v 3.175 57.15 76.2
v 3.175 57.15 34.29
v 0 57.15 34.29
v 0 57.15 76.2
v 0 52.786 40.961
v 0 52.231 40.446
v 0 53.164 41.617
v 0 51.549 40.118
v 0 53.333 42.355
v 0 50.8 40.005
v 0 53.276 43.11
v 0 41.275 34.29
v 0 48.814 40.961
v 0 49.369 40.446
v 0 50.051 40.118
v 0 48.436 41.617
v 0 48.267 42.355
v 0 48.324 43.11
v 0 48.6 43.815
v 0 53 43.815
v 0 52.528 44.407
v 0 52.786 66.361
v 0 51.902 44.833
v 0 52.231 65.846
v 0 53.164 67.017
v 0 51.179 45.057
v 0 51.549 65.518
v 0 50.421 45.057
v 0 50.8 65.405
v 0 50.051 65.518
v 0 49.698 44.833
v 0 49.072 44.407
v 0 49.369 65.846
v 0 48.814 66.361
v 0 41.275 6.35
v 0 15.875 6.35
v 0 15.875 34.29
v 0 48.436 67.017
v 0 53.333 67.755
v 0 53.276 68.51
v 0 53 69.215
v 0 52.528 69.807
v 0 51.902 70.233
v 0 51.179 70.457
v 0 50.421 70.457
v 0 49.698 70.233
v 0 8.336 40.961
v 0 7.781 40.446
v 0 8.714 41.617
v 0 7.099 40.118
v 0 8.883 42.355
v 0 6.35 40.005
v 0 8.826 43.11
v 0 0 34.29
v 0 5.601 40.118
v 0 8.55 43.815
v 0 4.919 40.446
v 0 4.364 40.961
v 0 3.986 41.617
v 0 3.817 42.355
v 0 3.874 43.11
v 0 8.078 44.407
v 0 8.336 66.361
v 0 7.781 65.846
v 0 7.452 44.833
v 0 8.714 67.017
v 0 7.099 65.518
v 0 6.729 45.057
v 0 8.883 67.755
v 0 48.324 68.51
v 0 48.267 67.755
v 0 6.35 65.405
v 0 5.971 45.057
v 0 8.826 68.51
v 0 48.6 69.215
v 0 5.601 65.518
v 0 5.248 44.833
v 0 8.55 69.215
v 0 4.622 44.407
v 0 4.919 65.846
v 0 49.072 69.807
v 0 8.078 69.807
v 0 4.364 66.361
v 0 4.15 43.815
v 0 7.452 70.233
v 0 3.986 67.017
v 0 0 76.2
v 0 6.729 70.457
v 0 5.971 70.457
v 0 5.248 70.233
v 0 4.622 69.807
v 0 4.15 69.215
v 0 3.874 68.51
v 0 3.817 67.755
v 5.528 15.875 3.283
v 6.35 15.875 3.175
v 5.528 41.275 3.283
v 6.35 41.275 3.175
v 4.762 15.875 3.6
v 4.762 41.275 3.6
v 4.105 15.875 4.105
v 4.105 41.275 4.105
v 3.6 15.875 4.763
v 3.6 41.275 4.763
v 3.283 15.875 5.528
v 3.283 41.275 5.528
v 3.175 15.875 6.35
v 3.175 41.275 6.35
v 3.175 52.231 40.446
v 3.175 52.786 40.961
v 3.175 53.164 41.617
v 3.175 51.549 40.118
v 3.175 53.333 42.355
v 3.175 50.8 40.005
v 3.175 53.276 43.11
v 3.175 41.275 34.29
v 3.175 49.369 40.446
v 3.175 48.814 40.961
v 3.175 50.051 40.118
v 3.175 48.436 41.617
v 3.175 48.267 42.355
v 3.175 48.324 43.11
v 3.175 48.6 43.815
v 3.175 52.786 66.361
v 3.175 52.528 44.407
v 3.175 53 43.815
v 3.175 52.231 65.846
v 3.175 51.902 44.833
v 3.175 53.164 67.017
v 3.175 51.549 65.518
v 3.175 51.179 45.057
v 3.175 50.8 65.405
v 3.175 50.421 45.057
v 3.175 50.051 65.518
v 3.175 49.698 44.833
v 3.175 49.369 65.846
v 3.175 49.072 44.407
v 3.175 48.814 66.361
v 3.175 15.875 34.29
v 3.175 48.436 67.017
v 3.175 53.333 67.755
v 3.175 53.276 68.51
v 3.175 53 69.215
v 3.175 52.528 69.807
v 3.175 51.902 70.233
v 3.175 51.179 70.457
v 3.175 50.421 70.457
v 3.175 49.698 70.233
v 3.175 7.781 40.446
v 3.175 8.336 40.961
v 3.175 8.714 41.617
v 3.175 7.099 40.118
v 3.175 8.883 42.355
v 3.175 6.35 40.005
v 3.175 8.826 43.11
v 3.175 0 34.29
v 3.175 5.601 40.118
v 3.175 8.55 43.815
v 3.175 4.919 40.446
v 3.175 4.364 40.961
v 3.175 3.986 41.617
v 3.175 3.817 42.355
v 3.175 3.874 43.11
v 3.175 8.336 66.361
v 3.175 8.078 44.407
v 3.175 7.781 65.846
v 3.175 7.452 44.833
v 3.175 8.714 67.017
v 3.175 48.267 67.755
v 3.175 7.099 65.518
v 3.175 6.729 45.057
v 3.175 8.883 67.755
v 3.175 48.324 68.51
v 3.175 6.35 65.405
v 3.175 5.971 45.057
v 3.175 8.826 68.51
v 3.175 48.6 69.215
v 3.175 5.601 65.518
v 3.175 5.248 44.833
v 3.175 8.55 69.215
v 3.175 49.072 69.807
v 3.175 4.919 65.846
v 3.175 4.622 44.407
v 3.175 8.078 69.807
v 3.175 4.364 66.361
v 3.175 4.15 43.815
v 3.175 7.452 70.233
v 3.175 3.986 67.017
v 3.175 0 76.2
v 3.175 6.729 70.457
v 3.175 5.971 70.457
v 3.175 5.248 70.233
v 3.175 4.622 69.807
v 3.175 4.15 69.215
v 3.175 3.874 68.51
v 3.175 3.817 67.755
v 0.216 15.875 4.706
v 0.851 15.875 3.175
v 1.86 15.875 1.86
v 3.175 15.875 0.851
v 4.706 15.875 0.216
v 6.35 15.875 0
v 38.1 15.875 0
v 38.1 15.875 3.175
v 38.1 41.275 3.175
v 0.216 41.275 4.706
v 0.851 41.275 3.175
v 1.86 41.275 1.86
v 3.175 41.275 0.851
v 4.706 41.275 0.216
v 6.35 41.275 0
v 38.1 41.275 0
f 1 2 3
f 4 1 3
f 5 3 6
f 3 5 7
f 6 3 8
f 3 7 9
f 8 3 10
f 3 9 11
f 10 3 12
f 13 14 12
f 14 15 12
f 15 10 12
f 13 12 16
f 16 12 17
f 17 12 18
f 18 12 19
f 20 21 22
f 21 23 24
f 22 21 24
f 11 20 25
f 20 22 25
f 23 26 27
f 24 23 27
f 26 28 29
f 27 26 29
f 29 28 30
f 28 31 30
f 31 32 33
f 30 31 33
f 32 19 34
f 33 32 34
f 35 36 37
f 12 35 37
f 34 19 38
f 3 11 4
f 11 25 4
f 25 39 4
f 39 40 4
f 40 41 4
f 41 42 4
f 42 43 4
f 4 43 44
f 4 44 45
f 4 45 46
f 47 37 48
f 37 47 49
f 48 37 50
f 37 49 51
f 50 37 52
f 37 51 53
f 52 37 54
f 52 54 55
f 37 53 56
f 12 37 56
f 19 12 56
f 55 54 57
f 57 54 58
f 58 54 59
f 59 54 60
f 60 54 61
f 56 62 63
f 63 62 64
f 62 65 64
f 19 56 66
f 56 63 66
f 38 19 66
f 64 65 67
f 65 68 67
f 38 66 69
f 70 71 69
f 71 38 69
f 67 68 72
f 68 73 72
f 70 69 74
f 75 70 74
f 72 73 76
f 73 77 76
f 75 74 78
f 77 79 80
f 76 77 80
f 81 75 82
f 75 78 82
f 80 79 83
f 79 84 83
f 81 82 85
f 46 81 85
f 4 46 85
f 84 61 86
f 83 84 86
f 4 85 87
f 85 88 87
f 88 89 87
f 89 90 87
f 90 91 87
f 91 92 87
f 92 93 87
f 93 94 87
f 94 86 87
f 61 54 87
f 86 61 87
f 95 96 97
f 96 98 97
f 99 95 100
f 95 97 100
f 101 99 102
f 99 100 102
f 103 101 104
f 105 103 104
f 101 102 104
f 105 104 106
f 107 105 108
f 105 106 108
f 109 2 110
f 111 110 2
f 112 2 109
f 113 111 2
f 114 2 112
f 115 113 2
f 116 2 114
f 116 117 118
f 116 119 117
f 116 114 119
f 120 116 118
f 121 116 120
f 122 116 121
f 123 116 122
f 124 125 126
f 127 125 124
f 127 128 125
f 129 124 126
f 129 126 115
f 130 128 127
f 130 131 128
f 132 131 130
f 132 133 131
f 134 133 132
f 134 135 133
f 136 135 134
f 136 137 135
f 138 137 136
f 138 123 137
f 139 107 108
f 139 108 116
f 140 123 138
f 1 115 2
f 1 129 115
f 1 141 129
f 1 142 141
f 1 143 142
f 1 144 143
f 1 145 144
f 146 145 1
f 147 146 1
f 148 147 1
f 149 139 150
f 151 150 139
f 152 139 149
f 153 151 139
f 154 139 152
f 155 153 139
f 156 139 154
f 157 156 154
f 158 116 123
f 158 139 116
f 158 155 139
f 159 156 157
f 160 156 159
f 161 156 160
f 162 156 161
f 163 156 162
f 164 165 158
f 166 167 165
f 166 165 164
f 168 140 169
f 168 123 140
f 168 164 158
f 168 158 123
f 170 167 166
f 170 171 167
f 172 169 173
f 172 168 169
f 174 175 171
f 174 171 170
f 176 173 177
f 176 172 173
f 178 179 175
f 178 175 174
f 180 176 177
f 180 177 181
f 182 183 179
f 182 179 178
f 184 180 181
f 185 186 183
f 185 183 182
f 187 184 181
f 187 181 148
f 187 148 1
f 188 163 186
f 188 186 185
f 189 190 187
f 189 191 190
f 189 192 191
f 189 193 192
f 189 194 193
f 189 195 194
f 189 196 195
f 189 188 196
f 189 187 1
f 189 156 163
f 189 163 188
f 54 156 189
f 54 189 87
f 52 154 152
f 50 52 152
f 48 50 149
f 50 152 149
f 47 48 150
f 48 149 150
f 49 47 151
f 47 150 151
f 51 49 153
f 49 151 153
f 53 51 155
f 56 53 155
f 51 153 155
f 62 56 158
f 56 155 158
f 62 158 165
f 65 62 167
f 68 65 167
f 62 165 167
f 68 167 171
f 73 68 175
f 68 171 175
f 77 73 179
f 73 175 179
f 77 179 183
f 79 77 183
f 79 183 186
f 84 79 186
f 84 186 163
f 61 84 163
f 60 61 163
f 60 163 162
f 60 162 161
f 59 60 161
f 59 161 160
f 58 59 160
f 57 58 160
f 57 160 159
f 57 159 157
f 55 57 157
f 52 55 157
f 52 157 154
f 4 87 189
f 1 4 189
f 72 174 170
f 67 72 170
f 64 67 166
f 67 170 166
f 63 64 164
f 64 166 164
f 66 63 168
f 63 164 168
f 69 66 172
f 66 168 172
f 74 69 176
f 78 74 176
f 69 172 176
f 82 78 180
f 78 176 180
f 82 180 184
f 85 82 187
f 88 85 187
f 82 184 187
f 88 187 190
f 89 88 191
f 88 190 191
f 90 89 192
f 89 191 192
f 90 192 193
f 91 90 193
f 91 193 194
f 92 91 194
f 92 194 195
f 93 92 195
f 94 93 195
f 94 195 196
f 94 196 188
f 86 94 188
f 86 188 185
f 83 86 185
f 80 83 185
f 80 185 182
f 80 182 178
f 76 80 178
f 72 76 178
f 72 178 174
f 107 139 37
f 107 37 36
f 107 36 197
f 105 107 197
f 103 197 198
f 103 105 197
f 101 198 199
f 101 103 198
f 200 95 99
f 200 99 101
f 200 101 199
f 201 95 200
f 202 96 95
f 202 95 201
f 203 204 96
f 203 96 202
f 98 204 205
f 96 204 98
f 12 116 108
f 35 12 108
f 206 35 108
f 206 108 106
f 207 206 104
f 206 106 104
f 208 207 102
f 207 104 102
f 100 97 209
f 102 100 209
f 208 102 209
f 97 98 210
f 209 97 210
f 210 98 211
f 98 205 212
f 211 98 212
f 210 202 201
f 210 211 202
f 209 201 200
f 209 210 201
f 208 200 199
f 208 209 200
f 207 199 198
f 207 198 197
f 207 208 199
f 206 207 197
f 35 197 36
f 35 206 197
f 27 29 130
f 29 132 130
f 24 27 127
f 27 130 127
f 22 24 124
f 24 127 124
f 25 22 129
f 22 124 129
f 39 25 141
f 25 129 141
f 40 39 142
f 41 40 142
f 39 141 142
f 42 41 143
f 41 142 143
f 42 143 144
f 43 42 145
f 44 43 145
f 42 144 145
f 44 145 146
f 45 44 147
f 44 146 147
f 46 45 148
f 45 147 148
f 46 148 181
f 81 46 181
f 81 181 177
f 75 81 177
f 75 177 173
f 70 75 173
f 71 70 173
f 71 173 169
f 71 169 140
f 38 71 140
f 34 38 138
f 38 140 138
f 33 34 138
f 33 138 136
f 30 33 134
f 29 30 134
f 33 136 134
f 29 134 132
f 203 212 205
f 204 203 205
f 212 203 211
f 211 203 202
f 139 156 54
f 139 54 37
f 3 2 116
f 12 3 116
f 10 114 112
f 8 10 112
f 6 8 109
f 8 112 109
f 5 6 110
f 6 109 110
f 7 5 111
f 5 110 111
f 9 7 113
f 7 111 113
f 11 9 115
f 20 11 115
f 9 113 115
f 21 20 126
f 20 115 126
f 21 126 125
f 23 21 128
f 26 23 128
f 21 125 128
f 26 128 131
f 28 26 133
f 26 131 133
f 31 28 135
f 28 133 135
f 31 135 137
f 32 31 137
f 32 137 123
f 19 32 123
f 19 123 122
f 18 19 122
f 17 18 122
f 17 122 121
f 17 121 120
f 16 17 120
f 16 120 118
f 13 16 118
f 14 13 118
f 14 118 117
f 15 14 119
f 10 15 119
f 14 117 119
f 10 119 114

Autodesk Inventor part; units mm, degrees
ref_plane "YZ Plane" through (0, 0, 0) normal (1, 0, 0) x (0, 1, 0)
ref_plane "XZ Plane" through (0, 0, 0) normal (0, 1, 0) x (-1, 0, 0)
ref_plane "XY Plane" through (0, 0, 0) normal (0, 0, 1) x (1, 0, 0)
sketch "Sketch1" plane through (0, 0, 0) normal (0, 1, 0) x (-1, 0, 0)
  line L0 (-38.1, 0) -> (0, 0)
  line L1 (0, 0) -> (0, 76.2)
  line L2 (0, 76.2) -> (-3.175, 76.2)
  line L3 (-38.1, 0) -> (-38.1, 3.175)
  line L4 (-38.1, 3.175) -> (-3.175, 3.175)
  line L5 (-3.175, 3.175) -> (-3.175, 76.2)
  dimension "d0" = 38.1
  dimension "d1" = 76.2
  dimension "d2" = 3.175
extrude "Extrusion1" add sketch "Sketch1" along normal blind 57.15
sketch "Sketch2" plane through (38.1, 0, 3.175) normal (1, 0, 0) x (0, 0, -1)
  line L0 (3.175, 57.15) -> (-31.115, 57.15)
  line L1 (-31.115, 57.15) -> (-31.115, 41.275)
  line L2 (-31.115, 41.275) -> (3.175, 41.275)
  line L3 (3.175, 41.275) -> (3.175, 57.15)
  line L4 (3.175, 0) -> (-31.115, 0)
  line L5 (-31.115, 0) -> (-31.115, 15.875)
  line L6 (-31.115, 15.875) -> (3.175, 15.875)
  line L7 (3.175, 15.875) -> (3.175, 0)
  line L8 (-64.77, 50.8) -> (-39.37, 50.8) construction
  line L9 (-39.37, 50.8) -> (-39.37, 6.35) construction
  line L10 (-39.37, 6.35) -> (-64.77, 6.35) construction
  line L11 (-64.77, 6.35) -> (-64.77, 50.8) construction
  line L12 (-52.07, 50.8) -> (-52.07, 57.15) construction
  line L13 (-52.07, 6.35) -> (-52.07, 0) construction
  line L14 (-73.025, 57.15) -> (0, 57.15) construction
  line L15 (0, 0) -> (-73.025, 0) construction
  circle A0 centre (-39.37, 50.8) radius 2.54
  circle A1 centre (-64.77, 50.8) radius 2.54
  circle A2 centre (-39.37, 6.35) radius 2.54
  circle A3 centre (-64.77, 6.35) radius 2.54
  line L16 (-73.025, 0) -> (-73.025, 57.15) construction
  line L17 (-39.37, 50.8) -> (-31.115, 50.8) construction
  line L18 (-64.77, 50.8) -> (-73.025, 50.8) construction
  dimension "d5" = 25.4
  dimension "d6" = 44.45
  dimension "d8" = 5.08
  dimension "d9" = 25.4
  dimension "d10" = 41.91
extrude "Extrusion2" cut sketch "Sketch2" against normal through all
fillet "Fillet1" radius 3.175 1 edges at (3.175, 28.575, 3.175)
fillet "Fillet1" radius 6.35 1 edges at (0, 28.575, 0)
properties part number "motor mount" material "Aluminum 6061"
